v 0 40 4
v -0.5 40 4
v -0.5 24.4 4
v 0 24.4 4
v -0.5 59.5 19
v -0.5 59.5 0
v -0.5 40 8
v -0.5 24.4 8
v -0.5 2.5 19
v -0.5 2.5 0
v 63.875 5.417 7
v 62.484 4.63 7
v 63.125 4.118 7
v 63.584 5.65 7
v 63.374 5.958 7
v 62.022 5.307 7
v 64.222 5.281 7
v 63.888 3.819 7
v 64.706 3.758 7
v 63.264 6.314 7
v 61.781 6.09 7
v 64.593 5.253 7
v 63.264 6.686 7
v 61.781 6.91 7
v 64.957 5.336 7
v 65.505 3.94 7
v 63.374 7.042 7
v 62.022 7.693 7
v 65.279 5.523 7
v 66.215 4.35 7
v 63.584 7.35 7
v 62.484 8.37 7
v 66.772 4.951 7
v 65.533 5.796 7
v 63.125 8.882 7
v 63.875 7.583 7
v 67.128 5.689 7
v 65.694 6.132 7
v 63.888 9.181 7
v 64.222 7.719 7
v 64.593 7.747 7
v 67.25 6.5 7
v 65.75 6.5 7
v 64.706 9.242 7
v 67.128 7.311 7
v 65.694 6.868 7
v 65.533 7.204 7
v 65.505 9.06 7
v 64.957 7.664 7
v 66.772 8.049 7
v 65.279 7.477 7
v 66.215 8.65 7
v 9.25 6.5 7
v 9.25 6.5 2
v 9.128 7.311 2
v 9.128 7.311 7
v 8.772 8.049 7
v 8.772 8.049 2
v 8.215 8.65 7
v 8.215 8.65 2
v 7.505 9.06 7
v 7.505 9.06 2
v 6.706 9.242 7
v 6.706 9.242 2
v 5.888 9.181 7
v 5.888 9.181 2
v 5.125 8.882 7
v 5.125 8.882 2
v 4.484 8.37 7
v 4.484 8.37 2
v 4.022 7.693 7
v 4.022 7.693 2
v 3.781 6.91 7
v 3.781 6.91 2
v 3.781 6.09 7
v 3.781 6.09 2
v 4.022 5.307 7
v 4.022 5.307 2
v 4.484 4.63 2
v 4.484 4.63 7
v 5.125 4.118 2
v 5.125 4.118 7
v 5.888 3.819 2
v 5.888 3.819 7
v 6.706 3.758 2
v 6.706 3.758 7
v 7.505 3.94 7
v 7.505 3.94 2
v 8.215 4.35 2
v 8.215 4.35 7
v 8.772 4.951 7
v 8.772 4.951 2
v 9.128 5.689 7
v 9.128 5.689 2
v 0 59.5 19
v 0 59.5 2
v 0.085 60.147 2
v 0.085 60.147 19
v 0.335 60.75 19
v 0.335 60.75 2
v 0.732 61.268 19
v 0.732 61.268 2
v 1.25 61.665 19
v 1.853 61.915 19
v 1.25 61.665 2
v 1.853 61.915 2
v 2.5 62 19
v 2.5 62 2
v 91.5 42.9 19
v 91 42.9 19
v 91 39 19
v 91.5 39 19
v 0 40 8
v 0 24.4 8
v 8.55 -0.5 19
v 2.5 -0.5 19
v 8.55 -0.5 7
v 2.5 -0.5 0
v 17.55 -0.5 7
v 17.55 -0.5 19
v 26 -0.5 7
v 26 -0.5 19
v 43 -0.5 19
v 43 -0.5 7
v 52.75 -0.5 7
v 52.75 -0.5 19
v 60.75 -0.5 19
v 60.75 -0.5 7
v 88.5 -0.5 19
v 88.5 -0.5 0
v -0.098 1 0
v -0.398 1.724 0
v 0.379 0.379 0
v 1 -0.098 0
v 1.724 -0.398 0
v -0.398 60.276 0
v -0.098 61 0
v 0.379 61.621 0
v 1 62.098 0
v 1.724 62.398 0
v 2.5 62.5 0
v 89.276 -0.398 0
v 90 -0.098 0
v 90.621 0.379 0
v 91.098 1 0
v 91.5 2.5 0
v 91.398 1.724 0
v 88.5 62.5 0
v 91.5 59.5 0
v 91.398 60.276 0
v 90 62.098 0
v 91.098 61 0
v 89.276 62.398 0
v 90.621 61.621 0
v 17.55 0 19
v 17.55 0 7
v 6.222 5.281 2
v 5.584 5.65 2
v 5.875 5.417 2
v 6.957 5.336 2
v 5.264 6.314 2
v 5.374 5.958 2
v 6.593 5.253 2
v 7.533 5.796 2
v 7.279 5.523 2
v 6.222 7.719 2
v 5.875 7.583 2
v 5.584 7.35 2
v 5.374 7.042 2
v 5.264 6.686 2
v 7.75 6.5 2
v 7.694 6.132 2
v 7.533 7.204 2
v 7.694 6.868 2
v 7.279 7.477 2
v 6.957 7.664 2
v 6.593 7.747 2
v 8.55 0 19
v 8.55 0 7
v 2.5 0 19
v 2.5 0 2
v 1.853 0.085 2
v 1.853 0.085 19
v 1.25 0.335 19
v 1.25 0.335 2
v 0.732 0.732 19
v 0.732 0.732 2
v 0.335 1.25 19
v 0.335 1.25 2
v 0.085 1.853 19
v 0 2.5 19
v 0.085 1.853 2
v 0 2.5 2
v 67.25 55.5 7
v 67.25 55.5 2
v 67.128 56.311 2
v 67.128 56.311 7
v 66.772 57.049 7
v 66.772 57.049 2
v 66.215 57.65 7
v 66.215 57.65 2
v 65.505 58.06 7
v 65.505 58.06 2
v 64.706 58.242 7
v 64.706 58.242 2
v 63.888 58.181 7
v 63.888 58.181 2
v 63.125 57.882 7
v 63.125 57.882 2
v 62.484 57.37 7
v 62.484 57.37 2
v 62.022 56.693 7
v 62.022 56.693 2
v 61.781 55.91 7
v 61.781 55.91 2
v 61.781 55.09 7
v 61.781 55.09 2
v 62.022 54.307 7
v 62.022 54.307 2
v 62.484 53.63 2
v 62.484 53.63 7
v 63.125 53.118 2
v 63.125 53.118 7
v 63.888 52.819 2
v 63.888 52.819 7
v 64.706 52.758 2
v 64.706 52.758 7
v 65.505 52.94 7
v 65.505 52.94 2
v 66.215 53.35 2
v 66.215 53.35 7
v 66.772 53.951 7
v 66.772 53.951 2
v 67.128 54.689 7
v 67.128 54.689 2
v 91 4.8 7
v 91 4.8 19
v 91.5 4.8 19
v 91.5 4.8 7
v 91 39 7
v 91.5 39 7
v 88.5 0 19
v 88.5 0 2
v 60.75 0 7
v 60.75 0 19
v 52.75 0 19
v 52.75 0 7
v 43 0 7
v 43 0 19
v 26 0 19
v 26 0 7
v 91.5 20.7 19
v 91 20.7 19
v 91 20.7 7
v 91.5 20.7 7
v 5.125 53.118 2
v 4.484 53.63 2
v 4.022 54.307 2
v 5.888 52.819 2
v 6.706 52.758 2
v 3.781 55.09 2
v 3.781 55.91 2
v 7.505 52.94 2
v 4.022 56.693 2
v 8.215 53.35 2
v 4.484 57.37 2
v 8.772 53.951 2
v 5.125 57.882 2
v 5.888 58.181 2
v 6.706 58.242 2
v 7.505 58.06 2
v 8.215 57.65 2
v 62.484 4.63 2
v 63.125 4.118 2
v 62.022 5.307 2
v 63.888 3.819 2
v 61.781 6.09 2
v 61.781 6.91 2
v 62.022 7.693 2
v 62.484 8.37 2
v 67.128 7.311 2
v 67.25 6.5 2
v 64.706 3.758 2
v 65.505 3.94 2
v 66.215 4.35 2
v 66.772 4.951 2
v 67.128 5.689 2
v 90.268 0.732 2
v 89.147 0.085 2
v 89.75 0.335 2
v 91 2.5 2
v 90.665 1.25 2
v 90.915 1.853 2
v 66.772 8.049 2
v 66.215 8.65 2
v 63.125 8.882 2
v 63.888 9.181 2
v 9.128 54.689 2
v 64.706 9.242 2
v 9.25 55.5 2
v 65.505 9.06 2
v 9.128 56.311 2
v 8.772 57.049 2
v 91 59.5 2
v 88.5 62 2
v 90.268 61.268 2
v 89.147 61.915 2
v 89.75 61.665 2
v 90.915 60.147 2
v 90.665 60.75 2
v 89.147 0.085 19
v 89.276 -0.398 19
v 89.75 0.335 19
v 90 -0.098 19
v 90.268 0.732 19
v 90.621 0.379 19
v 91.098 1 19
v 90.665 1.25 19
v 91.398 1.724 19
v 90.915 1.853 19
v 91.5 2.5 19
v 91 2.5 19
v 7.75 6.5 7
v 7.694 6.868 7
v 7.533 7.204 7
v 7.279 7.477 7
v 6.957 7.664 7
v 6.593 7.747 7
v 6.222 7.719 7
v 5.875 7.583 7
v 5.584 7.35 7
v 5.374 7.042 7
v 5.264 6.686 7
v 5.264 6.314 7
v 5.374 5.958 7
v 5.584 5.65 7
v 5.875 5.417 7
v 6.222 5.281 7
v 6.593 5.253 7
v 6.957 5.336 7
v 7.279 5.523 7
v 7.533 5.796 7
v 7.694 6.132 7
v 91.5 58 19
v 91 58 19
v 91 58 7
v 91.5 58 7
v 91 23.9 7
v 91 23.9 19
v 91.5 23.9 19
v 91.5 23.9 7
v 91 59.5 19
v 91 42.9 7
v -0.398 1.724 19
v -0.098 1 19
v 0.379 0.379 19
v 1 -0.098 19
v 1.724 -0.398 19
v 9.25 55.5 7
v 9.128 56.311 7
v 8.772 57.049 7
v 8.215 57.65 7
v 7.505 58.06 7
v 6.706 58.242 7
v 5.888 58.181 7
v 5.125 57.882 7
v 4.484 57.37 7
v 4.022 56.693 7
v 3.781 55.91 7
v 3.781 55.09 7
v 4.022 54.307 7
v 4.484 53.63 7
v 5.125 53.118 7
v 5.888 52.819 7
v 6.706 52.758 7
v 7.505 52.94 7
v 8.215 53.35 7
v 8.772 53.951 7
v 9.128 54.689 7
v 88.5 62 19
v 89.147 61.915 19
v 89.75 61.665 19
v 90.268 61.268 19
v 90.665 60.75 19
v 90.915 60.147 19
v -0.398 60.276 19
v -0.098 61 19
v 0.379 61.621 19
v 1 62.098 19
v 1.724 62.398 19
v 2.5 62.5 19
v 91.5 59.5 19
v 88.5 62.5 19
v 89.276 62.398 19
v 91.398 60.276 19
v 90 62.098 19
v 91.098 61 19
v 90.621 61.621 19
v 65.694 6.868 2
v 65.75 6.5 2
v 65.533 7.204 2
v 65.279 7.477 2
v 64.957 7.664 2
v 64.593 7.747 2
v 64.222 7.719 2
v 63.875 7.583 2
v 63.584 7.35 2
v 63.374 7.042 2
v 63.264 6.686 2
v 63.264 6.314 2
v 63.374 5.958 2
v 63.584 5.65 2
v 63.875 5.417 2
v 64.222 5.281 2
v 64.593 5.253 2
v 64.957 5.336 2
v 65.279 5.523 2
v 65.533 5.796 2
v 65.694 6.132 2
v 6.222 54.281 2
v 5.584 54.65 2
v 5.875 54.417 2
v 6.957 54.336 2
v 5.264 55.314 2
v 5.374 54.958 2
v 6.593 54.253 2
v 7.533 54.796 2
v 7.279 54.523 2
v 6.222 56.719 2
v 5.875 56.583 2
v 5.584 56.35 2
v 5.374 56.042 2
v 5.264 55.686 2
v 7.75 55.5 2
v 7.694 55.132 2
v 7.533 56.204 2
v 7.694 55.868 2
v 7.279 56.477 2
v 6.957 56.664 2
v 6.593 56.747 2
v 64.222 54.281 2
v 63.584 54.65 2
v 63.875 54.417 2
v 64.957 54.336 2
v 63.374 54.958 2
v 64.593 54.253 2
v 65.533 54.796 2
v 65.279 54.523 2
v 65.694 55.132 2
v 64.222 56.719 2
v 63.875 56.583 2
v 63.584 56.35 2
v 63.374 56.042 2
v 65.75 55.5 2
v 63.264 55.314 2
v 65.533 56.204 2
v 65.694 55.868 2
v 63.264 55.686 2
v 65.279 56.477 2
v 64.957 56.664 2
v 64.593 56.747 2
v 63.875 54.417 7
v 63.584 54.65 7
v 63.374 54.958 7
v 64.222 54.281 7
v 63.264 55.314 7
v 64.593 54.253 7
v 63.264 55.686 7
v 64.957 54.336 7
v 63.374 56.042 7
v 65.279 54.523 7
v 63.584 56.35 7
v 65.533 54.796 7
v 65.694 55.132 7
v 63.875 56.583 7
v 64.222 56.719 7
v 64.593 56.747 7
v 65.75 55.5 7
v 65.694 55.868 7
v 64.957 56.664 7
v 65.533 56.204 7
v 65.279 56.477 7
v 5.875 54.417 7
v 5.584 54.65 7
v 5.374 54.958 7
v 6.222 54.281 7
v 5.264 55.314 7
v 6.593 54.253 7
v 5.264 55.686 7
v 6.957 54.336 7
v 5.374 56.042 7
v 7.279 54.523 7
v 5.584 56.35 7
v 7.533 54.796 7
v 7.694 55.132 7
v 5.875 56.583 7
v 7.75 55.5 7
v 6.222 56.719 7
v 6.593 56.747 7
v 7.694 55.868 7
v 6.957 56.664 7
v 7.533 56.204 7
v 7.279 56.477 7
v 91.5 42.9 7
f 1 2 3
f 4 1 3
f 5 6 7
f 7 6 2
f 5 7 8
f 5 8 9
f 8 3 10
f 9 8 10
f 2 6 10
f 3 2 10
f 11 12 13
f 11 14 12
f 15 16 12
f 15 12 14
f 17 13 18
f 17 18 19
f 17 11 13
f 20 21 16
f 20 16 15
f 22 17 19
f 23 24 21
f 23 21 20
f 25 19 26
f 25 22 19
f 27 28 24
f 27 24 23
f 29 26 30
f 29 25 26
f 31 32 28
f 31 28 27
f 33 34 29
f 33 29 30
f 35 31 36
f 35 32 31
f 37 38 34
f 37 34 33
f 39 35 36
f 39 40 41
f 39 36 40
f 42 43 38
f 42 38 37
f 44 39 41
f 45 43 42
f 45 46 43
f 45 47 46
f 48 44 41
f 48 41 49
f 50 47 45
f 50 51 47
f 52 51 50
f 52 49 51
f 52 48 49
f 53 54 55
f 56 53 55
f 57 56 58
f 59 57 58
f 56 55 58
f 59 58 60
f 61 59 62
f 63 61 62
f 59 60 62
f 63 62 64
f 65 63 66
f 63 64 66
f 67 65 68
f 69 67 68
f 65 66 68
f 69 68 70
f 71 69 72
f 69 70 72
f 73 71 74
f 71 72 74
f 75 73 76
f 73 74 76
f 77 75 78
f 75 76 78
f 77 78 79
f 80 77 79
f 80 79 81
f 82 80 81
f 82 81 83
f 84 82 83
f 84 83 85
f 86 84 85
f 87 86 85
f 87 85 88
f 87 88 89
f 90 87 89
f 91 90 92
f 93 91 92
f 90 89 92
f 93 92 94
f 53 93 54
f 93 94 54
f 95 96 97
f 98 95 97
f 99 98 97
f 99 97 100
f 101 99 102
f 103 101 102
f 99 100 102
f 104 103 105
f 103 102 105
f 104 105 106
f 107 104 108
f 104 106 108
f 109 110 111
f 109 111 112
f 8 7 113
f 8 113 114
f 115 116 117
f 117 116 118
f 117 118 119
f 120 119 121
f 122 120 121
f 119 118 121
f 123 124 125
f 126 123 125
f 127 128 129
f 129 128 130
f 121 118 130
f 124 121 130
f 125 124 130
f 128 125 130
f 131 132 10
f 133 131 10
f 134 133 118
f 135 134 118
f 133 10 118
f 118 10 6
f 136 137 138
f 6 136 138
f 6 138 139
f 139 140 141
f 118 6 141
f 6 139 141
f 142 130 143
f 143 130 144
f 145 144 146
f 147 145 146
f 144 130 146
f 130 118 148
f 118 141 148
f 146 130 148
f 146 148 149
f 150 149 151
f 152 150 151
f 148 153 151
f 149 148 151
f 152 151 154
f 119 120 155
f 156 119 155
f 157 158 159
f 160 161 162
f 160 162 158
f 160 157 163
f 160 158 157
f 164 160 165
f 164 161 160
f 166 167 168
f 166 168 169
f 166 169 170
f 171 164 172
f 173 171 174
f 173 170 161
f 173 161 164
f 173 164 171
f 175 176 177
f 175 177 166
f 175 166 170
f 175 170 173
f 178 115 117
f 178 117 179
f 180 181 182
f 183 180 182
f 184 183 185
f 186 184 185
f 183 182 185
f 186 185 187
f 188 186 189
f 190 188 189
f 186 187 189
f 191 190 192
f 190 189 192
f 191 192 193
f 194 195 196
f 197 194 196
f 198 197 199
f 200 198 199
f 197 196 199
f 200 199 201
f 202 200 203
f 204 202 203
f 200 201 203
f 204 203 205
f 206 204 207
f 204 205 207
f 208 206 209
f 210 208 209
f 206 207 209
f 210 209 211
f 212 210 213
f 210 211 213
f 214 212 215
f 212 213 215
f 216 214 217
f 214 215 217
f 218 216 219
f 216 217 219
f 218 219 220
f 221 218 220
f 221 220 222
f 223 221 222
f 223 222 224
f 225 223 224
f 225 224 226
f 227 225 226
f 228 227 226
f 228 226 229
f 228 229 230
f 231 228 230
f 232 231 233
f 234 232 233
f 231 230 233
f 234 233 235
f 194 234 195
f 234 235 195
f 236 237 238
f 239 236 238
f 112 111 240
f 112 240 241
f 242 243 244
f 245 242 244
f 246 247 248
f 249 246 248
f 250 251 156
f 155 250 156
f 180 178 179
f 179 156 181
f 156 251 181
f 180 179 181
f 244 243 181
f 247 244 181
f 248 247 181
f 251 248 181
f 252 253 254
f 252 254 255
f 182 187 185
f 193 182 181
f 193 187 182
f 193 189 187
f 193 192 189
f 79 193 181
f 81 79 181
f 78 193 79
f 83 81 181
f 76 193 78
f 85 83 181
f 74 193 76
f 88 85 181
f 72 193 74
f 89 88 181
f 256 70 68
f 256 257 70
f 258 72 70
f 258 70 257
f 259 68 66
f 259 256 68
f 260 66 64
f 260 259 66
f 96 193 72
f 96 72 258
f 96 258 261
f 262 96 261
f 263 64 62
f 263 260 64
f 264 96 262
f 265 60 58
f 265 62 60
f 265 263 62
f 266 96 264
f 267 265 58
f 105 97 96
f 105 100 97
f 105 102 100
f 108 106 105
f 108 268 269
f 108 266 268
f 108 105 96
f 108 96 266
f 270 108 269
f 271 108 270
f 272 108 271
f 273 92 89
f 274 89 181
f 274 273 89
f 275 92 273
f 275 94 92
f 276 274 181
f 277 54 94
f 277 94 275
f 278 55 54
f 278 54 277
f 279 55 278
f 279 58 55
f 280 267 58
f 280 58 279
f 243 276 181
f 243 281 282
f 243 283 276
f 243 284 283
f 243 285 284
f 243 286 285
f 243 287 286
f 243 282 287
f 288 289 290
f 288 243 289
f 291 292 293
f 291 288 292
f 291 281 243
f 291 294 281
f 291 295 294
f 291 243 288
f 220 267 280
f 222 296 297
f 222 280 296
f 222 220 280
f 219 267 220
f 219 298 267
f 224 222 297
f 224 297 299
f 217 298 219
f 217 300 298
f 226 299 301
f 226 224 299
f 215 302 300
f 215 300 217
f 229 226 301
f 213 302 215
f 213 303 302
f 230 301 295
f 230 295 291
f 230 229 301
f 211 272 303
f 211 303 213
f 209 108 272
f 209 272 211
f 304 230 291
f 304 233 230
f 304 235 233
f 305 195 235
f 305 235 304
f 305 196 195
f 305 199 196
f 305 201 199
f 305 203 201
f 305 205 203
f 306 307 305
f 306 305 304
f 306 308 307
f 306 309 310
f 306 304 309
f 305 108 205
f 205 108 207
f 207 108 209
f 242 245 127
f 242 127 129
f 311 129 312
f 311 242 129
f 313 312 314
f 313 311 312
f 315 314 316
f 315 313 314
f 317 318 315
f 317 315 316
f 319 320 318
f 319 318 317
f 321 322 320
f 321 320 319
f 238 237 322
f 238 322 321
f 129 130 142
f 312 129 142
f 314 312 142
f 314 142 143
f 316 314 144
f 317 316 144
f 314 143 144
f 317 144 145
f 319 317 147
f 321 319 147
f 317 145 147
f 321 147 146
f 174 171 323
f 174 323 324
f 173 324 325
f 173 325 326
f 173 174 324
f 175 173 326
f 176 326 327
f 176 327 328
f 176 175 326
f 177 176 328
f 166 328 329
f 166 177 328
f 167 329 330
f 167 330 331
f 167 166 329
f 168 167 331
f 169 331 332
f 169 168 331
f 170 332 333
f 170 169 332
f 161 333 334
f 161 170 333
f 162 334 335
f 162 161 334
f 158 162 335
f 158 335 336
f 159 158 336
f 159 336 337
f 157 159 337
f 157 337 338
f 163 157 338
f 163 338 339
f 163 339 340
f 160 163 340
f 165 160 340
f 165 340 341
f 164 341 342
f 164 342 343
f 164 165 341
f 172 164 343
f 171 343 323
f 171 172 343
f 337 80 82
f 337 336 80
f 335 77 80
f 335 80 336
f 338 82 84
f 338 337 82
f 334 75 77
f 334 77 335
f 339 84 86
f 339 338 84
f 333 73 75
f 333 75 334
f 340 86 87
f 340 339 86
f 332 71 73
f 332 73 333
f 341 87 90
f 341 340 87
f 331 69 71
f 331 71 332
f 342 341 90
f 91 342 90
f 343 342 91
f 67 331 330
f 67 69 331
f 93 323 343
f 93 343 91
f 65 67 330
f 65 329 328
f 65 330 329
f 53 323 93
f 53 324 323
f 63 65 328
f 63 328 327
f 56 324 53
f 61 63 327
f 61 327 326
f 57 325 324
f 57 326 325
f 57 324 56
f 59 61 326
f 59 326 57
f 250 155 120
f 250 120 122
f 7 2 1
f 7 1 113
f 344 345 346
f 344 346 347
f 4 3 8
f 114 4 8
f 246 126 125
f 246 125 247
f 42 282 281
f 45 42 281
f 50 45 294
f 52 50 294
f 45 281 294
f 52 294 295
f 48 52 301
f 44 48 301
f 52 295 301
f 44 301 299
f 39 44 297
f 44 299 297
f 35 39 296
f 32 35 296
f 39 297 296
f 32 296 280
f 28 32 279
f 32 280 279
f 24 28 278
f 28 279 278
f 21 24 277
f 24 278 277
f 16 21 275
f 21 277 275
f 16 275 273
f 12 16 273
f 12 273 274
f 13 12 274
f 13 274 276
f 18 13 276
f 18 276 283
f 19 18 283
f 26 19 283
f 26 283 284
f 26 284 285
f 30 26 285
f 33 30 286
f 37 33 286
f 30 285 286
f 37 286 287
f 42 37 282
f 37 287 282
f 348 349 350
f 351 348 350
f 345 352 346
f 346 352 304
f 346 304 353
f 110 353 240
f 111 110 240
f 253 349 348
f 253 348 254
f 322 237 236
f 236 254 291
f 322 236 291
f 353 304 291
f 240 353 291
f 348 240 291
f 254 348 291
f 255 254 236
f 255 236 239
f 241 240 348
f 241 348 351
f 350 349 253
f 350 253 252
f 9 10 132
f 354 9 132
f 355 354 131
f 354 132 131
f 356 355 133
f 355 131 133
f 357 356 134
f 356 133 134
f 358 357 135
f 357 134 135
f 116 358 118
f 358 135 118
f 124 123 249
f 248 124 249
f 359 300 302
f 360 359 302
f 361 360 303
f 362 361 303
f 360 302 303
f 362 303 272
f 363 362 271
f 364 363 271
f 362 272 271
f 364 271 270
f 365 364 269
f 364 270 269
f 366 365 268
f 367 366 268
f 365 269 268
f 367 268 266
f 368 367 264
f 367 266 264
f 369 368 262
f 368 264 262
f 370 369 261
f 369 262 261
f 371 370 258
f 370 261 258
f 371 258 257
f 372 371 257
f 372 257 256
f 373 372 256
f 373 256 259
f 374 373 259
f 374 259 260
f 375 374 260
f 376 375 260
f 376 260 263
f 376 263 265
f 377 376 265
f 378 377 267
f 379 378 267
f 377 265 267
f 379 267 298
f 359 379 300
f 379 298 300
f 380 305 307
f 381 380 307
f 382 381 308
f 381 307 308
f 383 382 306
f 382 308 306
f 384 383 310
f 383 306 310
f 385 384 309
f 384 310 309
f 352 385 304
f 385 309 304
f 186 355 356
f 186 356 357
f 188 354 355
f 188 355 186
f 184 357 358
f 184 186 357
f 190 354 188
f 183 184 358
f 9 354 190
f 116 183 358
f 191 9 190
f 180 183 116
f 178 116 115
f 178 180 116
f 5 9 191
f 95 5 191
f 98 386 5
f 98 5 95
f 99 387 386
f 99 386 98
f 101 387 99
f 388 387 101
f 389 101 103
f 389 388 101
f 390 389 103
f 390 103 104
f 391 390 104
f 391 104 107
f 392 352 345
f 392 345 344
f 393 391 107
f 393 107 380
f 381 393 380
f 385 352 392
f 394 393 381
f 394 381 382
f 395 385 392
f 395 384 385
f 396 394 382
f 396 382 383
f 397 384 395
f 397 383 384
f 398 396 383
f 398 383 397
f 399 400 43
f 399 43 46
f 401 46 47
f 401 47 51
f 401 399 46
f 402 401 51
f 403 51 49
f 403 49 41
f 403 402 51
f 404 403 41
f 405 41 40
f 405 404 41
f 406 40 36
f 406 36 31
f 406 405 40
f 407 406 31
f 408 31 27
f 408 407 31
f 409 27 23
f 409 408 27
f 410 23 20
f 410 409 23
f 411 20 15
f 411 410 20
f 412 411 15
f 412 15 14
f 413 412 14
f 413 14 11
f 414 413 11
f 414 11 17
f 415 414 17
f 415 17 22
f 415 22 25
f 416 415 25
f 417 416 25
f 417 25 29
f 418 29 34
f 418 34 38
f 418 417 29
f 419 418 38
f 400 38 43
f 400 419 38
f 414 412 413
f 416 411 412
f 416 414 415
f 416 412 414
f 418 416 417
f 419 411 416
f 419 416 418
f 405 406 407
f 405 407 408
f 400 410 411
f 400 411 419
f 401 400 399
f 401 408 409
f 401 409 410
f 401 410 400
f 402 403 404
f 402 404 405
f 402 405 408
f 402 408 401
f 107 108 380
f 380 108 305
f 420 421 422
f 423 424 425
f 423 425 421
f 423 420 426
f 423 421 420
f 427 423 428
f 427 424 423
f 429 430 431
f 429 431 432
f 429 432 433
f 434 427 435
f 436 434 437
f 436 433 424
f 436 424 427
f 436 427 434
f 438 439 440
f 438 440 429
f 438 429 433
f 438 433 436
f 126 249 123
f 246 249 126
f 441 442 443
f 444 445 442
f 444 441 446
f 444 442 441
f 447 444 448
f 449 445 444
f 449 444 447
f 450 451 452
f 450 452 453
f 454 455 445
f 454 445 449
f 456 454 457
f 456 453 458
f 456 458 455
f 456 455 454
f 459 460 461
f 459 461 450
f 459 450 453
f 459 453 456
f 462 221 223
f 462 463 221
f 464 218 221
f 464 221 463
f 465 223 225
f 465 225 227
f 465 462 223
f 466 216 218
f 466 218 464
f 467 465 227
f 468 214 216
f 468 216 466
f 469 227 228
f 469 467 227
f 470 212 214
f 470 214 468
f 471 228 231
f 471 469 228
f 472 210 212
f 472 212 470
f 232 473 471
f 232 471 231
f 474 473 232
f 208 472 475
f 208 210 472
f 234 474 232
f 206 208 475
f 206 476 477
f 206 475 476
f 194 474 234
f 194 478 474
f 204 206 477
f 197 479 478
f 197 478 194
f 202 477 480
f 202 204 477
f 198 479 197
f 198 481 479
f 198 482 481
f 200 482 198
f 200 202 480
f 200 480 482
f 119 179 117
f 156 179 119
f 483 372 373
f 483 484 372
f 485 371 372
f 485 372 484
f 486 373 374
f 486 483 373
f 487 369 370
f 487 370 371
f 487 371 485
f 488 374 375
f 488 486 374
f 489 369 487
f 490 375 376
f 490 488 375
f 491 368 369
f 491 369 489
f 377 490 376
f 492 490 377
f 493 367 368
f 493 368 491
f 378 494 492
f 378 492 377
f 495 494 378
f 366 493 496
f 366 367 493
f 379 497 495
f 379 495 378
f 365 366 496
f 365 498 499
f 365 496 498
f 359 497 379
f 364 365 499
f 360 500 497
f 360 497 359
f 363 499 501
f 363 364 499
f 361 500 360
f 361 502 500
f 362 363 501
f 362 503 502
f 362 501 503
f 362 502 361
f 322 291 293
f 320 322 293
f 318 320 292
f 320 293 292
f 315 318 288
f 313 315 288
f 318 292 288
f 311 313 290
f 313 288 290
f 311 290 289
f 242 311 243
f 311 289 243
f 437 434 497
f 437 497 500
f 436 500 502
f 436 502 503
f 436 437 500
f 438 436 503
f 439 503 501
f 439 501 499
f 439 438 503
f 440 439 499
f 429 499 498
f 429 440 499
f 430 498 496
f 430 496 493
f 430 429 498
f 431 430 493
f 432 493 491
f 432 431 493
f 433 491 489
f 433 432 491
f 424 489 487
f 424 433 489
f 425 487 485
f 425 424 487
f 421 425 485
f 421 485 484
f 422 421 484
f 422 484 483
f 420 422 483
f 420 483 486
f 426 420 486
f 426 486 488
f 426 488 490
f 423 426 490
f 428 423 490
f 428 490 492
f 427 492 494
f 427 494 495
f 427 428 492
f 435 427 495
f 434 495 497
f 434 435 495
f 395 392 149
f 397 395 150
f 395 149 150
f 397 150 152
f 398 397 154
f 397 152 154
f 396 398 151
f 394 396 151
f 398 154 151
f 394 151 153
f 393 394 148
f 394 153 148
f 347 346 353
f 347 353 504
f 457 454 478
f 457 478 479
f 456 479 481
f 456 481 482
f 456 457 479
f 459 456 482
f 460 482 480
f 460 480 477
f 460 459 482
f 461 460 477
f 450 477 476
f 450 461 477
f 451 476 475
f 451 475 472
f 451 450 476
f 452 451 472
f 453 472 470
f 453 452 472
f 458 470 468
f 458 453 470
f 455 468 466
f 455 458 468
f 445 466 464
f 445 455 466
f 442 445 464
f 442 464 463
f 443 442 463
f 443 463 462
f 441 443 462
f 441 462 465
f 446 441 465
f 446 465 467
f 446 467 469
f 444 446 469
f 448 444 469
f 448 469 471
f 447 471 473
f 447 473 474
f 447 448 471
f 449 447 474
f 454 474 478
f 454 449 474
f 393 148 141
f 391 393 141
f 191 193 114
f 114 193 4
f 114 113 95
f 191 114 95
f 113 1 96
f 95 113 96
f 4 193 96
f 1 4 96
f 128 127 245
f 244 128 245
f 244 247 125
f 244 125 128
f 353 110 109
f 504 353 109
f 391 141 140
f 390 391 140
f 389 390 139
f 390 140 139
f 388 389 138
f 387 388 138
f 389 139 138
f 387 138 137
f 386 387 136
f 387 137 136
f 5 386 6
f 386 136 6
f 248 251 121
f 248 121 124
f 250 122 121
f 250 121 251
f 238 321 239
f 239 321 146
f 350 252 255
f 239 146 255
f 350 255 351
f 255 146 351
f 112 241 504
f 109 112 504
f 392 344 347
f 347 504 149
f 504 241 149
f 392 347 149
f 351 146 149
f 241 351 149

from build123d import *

# Parameters (mm, degrees)
F1_DEPTH = 2
F2_DEPTH = 19
F3_R     = 2.75
F3_R_2   = 1.25
F4_DEPTH = 5
F5_W     = 9
F5_H     = 0.5
F5_W_2   = 17
F5_W_3   = 8
F5_W_4   = 0.5
F5_H_2   = 15.1
F5_H_3   = 15.9
F6_DEPTH = 12
F7_W     = 15.6
F7_H     = 4
F8_DEPTH = 0.5


with BuildPart() as f1:
    # F0 (on Top) → F1 (new body)
    with BuildSketch(Plane.XY):
        with BuildLine():
            Line((88.5, 62.5), (2.5, 62.5))
            ThreePointArc((2.5, 62.5), (0.3786796564, 61.6213203436), (-0.5, 59.5))
            Line((-0.5, 59.5), (-0.5, 2.5))
            ThreePointArc((-0.5, 2.5), (0.3786796564, 0.3786796564), (2.5, -0.5))
            Line((2.5, -0.5), (88.5, -0.5))
            ThreePointArc((88.5, -0.5), (90.6213203436, 0.3786796564), (91.5, 2.5))
            Line((91.5, 2.5), (91.5, 59.5))
            ThreePointArc((91.5, 59.5), (90.6213203436, 61.6213203436), (88.5, 62.5))
        make_face()
        with BuildLine():
            Line((88.5, 0), (2.5, 0))
            ThreePointArc((2.5, 0), (0.732233047, 0.732233047), (0, 2.5))
            Line((0, 2.5), (0, 59.5))
            ThreePointArc((0, 59.5), (0.732233047, 61.267766953), (2.5, 62))
            Line((2.5, 62), (88.5, 62))
            ThreePointArc((88.5, 62), (90.267766953, 61.267766953), (91, 59.5))
            Line((91, 59.5), (91, 2.5))
            ThreePointArc((91, 2.5), (90.267766953, 0.732233047), (88.5, 0))
        make_face(mode=Mode.SUBTRACT)
        with BuildLine():
            ThreePointArc((0, 2.5), (0.732233047, 0.732233047), (2.5, 0))
            Line((2.5, 0), (88.5, 0))
            ThreePointArc((88.5, 0), (90.267766953, 0.732233047), (91, 2.5))
            Line((91, 2.5), (91, 59.5))
            ThreePointArc((91, 59.5), (90.267766953, 61.267766953), (88.5, 62))
            Line((88.5, 62), (2.5, 62))
            ThreePointArc((2.5, 62), (0.732233047, 61.267766953), (0, 59.5))
            Line((0, 59.5), (0, 2.5))
        make_face()
    extrude(amount=F1_DEPTH)

    # F0 (on Top) → F2 (join)
    with BuildSketch(Plane.XY):
        with BuildLine():
            Line((88.5, 62.5), (2.5, 62.5))
            ThreePointArc((2.5, 62.5), (0.3786796564, 61.6213203436), (-0.5, 59.5))
            Line((-0.5, 59.5), (-0.5, 2.5))
            ThreePointArc((-0.5, 2.5), (0.3786796564, 0.3786796564), (2.5, -0.5))
            Line((2.5, -0.5), (88.5, -0.5))
            ThreePointArc((88.5, -0.5), (90.6213203436, 0.3786796564), (91.5, 2.5))
            Line((91.5, 2.5), (91.5, 59.5))
            ThreePointArc((91.5, 59.5), (90.6213203436, 61.6213203436), (88.5, 62.5))
        make_face()
        with BuildLine():
            Line((88.5, 0), (2.5, 0))
            ThreePointArc((2.5, 0), (0.732233047, 0.732233047), (0, 2.5))
            Line((0, 2.5), (0, 59.5))
            ThreePointArc((0, 59.5), (0.732233047, 61.267766953), (2.5, 62))
            Line((2.5, 62), (88.5, 62))
            ThreePointArc((88.5, 62), (90.267766953, 61.267766953), (91, 59.5))
            Line((91, 59.5), (91, 2.5))
            ThreePointArc((91, 2.5), (90.267766953, 0.732233047), (88.5, 0))
        make_face(mode=Mode.SUBTRACT)
    extrude(amount=F2_DEPTH)

    # F3 (on face) → F4 (join)
    with BuildSketch(Plane.XY.offset(2)):
        with Locations((6.5, 55.5)):
            Circle(F3_R)
        with Locations((6.5, 55.5)):
            Circle(F3_R_2, mode=Mode.SUBTRACT)
        with Locations((64.5, 55.5)):
            Circle(F3_R)
        with Locations((64.5, 55.5)):
            Circle(F3_R_2, mode=Mode.SUBTRACT)
        with Locations((6.5, 6.5)):
            Circle(F3_R)
        with Locations((6.5, 6.5)):
            Circle(F3_R_2, mode=Mode.SUBTRACT)
        with Locations((64.5, 6.5)):
            Circle(F3_R)
        with Locations((64.5, 6.5)):
            Circle(F3_R_2, mode=Mode.SUBTRACT)
    extrude(amount=F4_DEPTH)

    # F5 (on face) → F6 (cut)
    with BuildSketch(Plane.XY.offset(19)):
        with Locations((13.05, -0.25)):
            Rectangle(F5_W, F5_H)
        with Locations((34.5, -0.25)):
            Rectangle(F5_W_2, F5_H)
        with Locations((56.75, -0.25)):
            Rectangle(F5_W_3, F5_H)
        with Locations((91.25, 50.45)):
            Rectangle(F5_W_4, F5_H_2)
        with Locations((91.25, 31.45)):
            Rectangle(F5_W_4, F5_H_2)
        with Locations((91.25, 12.75)):
            Rectangle(F5_W_4, F5_H_3)
    extrude(amount=-F6_DEPTH, mode=Mode.SUBTRACT)

    # F7 (on face) → F8 (cut)
    with BuildSketch(Plane(origin=(-0.5, 0, 0), x_dir=(0, -1, 0), z_dir=(-1, 0, 0))):
        with Locations((-32.2, 6)):
            Rectangle(F7_W, F7_H)
    extrude(amount=-F8_DEPTH, mode=Mode.SUBTRACT)


solid = f1.part
